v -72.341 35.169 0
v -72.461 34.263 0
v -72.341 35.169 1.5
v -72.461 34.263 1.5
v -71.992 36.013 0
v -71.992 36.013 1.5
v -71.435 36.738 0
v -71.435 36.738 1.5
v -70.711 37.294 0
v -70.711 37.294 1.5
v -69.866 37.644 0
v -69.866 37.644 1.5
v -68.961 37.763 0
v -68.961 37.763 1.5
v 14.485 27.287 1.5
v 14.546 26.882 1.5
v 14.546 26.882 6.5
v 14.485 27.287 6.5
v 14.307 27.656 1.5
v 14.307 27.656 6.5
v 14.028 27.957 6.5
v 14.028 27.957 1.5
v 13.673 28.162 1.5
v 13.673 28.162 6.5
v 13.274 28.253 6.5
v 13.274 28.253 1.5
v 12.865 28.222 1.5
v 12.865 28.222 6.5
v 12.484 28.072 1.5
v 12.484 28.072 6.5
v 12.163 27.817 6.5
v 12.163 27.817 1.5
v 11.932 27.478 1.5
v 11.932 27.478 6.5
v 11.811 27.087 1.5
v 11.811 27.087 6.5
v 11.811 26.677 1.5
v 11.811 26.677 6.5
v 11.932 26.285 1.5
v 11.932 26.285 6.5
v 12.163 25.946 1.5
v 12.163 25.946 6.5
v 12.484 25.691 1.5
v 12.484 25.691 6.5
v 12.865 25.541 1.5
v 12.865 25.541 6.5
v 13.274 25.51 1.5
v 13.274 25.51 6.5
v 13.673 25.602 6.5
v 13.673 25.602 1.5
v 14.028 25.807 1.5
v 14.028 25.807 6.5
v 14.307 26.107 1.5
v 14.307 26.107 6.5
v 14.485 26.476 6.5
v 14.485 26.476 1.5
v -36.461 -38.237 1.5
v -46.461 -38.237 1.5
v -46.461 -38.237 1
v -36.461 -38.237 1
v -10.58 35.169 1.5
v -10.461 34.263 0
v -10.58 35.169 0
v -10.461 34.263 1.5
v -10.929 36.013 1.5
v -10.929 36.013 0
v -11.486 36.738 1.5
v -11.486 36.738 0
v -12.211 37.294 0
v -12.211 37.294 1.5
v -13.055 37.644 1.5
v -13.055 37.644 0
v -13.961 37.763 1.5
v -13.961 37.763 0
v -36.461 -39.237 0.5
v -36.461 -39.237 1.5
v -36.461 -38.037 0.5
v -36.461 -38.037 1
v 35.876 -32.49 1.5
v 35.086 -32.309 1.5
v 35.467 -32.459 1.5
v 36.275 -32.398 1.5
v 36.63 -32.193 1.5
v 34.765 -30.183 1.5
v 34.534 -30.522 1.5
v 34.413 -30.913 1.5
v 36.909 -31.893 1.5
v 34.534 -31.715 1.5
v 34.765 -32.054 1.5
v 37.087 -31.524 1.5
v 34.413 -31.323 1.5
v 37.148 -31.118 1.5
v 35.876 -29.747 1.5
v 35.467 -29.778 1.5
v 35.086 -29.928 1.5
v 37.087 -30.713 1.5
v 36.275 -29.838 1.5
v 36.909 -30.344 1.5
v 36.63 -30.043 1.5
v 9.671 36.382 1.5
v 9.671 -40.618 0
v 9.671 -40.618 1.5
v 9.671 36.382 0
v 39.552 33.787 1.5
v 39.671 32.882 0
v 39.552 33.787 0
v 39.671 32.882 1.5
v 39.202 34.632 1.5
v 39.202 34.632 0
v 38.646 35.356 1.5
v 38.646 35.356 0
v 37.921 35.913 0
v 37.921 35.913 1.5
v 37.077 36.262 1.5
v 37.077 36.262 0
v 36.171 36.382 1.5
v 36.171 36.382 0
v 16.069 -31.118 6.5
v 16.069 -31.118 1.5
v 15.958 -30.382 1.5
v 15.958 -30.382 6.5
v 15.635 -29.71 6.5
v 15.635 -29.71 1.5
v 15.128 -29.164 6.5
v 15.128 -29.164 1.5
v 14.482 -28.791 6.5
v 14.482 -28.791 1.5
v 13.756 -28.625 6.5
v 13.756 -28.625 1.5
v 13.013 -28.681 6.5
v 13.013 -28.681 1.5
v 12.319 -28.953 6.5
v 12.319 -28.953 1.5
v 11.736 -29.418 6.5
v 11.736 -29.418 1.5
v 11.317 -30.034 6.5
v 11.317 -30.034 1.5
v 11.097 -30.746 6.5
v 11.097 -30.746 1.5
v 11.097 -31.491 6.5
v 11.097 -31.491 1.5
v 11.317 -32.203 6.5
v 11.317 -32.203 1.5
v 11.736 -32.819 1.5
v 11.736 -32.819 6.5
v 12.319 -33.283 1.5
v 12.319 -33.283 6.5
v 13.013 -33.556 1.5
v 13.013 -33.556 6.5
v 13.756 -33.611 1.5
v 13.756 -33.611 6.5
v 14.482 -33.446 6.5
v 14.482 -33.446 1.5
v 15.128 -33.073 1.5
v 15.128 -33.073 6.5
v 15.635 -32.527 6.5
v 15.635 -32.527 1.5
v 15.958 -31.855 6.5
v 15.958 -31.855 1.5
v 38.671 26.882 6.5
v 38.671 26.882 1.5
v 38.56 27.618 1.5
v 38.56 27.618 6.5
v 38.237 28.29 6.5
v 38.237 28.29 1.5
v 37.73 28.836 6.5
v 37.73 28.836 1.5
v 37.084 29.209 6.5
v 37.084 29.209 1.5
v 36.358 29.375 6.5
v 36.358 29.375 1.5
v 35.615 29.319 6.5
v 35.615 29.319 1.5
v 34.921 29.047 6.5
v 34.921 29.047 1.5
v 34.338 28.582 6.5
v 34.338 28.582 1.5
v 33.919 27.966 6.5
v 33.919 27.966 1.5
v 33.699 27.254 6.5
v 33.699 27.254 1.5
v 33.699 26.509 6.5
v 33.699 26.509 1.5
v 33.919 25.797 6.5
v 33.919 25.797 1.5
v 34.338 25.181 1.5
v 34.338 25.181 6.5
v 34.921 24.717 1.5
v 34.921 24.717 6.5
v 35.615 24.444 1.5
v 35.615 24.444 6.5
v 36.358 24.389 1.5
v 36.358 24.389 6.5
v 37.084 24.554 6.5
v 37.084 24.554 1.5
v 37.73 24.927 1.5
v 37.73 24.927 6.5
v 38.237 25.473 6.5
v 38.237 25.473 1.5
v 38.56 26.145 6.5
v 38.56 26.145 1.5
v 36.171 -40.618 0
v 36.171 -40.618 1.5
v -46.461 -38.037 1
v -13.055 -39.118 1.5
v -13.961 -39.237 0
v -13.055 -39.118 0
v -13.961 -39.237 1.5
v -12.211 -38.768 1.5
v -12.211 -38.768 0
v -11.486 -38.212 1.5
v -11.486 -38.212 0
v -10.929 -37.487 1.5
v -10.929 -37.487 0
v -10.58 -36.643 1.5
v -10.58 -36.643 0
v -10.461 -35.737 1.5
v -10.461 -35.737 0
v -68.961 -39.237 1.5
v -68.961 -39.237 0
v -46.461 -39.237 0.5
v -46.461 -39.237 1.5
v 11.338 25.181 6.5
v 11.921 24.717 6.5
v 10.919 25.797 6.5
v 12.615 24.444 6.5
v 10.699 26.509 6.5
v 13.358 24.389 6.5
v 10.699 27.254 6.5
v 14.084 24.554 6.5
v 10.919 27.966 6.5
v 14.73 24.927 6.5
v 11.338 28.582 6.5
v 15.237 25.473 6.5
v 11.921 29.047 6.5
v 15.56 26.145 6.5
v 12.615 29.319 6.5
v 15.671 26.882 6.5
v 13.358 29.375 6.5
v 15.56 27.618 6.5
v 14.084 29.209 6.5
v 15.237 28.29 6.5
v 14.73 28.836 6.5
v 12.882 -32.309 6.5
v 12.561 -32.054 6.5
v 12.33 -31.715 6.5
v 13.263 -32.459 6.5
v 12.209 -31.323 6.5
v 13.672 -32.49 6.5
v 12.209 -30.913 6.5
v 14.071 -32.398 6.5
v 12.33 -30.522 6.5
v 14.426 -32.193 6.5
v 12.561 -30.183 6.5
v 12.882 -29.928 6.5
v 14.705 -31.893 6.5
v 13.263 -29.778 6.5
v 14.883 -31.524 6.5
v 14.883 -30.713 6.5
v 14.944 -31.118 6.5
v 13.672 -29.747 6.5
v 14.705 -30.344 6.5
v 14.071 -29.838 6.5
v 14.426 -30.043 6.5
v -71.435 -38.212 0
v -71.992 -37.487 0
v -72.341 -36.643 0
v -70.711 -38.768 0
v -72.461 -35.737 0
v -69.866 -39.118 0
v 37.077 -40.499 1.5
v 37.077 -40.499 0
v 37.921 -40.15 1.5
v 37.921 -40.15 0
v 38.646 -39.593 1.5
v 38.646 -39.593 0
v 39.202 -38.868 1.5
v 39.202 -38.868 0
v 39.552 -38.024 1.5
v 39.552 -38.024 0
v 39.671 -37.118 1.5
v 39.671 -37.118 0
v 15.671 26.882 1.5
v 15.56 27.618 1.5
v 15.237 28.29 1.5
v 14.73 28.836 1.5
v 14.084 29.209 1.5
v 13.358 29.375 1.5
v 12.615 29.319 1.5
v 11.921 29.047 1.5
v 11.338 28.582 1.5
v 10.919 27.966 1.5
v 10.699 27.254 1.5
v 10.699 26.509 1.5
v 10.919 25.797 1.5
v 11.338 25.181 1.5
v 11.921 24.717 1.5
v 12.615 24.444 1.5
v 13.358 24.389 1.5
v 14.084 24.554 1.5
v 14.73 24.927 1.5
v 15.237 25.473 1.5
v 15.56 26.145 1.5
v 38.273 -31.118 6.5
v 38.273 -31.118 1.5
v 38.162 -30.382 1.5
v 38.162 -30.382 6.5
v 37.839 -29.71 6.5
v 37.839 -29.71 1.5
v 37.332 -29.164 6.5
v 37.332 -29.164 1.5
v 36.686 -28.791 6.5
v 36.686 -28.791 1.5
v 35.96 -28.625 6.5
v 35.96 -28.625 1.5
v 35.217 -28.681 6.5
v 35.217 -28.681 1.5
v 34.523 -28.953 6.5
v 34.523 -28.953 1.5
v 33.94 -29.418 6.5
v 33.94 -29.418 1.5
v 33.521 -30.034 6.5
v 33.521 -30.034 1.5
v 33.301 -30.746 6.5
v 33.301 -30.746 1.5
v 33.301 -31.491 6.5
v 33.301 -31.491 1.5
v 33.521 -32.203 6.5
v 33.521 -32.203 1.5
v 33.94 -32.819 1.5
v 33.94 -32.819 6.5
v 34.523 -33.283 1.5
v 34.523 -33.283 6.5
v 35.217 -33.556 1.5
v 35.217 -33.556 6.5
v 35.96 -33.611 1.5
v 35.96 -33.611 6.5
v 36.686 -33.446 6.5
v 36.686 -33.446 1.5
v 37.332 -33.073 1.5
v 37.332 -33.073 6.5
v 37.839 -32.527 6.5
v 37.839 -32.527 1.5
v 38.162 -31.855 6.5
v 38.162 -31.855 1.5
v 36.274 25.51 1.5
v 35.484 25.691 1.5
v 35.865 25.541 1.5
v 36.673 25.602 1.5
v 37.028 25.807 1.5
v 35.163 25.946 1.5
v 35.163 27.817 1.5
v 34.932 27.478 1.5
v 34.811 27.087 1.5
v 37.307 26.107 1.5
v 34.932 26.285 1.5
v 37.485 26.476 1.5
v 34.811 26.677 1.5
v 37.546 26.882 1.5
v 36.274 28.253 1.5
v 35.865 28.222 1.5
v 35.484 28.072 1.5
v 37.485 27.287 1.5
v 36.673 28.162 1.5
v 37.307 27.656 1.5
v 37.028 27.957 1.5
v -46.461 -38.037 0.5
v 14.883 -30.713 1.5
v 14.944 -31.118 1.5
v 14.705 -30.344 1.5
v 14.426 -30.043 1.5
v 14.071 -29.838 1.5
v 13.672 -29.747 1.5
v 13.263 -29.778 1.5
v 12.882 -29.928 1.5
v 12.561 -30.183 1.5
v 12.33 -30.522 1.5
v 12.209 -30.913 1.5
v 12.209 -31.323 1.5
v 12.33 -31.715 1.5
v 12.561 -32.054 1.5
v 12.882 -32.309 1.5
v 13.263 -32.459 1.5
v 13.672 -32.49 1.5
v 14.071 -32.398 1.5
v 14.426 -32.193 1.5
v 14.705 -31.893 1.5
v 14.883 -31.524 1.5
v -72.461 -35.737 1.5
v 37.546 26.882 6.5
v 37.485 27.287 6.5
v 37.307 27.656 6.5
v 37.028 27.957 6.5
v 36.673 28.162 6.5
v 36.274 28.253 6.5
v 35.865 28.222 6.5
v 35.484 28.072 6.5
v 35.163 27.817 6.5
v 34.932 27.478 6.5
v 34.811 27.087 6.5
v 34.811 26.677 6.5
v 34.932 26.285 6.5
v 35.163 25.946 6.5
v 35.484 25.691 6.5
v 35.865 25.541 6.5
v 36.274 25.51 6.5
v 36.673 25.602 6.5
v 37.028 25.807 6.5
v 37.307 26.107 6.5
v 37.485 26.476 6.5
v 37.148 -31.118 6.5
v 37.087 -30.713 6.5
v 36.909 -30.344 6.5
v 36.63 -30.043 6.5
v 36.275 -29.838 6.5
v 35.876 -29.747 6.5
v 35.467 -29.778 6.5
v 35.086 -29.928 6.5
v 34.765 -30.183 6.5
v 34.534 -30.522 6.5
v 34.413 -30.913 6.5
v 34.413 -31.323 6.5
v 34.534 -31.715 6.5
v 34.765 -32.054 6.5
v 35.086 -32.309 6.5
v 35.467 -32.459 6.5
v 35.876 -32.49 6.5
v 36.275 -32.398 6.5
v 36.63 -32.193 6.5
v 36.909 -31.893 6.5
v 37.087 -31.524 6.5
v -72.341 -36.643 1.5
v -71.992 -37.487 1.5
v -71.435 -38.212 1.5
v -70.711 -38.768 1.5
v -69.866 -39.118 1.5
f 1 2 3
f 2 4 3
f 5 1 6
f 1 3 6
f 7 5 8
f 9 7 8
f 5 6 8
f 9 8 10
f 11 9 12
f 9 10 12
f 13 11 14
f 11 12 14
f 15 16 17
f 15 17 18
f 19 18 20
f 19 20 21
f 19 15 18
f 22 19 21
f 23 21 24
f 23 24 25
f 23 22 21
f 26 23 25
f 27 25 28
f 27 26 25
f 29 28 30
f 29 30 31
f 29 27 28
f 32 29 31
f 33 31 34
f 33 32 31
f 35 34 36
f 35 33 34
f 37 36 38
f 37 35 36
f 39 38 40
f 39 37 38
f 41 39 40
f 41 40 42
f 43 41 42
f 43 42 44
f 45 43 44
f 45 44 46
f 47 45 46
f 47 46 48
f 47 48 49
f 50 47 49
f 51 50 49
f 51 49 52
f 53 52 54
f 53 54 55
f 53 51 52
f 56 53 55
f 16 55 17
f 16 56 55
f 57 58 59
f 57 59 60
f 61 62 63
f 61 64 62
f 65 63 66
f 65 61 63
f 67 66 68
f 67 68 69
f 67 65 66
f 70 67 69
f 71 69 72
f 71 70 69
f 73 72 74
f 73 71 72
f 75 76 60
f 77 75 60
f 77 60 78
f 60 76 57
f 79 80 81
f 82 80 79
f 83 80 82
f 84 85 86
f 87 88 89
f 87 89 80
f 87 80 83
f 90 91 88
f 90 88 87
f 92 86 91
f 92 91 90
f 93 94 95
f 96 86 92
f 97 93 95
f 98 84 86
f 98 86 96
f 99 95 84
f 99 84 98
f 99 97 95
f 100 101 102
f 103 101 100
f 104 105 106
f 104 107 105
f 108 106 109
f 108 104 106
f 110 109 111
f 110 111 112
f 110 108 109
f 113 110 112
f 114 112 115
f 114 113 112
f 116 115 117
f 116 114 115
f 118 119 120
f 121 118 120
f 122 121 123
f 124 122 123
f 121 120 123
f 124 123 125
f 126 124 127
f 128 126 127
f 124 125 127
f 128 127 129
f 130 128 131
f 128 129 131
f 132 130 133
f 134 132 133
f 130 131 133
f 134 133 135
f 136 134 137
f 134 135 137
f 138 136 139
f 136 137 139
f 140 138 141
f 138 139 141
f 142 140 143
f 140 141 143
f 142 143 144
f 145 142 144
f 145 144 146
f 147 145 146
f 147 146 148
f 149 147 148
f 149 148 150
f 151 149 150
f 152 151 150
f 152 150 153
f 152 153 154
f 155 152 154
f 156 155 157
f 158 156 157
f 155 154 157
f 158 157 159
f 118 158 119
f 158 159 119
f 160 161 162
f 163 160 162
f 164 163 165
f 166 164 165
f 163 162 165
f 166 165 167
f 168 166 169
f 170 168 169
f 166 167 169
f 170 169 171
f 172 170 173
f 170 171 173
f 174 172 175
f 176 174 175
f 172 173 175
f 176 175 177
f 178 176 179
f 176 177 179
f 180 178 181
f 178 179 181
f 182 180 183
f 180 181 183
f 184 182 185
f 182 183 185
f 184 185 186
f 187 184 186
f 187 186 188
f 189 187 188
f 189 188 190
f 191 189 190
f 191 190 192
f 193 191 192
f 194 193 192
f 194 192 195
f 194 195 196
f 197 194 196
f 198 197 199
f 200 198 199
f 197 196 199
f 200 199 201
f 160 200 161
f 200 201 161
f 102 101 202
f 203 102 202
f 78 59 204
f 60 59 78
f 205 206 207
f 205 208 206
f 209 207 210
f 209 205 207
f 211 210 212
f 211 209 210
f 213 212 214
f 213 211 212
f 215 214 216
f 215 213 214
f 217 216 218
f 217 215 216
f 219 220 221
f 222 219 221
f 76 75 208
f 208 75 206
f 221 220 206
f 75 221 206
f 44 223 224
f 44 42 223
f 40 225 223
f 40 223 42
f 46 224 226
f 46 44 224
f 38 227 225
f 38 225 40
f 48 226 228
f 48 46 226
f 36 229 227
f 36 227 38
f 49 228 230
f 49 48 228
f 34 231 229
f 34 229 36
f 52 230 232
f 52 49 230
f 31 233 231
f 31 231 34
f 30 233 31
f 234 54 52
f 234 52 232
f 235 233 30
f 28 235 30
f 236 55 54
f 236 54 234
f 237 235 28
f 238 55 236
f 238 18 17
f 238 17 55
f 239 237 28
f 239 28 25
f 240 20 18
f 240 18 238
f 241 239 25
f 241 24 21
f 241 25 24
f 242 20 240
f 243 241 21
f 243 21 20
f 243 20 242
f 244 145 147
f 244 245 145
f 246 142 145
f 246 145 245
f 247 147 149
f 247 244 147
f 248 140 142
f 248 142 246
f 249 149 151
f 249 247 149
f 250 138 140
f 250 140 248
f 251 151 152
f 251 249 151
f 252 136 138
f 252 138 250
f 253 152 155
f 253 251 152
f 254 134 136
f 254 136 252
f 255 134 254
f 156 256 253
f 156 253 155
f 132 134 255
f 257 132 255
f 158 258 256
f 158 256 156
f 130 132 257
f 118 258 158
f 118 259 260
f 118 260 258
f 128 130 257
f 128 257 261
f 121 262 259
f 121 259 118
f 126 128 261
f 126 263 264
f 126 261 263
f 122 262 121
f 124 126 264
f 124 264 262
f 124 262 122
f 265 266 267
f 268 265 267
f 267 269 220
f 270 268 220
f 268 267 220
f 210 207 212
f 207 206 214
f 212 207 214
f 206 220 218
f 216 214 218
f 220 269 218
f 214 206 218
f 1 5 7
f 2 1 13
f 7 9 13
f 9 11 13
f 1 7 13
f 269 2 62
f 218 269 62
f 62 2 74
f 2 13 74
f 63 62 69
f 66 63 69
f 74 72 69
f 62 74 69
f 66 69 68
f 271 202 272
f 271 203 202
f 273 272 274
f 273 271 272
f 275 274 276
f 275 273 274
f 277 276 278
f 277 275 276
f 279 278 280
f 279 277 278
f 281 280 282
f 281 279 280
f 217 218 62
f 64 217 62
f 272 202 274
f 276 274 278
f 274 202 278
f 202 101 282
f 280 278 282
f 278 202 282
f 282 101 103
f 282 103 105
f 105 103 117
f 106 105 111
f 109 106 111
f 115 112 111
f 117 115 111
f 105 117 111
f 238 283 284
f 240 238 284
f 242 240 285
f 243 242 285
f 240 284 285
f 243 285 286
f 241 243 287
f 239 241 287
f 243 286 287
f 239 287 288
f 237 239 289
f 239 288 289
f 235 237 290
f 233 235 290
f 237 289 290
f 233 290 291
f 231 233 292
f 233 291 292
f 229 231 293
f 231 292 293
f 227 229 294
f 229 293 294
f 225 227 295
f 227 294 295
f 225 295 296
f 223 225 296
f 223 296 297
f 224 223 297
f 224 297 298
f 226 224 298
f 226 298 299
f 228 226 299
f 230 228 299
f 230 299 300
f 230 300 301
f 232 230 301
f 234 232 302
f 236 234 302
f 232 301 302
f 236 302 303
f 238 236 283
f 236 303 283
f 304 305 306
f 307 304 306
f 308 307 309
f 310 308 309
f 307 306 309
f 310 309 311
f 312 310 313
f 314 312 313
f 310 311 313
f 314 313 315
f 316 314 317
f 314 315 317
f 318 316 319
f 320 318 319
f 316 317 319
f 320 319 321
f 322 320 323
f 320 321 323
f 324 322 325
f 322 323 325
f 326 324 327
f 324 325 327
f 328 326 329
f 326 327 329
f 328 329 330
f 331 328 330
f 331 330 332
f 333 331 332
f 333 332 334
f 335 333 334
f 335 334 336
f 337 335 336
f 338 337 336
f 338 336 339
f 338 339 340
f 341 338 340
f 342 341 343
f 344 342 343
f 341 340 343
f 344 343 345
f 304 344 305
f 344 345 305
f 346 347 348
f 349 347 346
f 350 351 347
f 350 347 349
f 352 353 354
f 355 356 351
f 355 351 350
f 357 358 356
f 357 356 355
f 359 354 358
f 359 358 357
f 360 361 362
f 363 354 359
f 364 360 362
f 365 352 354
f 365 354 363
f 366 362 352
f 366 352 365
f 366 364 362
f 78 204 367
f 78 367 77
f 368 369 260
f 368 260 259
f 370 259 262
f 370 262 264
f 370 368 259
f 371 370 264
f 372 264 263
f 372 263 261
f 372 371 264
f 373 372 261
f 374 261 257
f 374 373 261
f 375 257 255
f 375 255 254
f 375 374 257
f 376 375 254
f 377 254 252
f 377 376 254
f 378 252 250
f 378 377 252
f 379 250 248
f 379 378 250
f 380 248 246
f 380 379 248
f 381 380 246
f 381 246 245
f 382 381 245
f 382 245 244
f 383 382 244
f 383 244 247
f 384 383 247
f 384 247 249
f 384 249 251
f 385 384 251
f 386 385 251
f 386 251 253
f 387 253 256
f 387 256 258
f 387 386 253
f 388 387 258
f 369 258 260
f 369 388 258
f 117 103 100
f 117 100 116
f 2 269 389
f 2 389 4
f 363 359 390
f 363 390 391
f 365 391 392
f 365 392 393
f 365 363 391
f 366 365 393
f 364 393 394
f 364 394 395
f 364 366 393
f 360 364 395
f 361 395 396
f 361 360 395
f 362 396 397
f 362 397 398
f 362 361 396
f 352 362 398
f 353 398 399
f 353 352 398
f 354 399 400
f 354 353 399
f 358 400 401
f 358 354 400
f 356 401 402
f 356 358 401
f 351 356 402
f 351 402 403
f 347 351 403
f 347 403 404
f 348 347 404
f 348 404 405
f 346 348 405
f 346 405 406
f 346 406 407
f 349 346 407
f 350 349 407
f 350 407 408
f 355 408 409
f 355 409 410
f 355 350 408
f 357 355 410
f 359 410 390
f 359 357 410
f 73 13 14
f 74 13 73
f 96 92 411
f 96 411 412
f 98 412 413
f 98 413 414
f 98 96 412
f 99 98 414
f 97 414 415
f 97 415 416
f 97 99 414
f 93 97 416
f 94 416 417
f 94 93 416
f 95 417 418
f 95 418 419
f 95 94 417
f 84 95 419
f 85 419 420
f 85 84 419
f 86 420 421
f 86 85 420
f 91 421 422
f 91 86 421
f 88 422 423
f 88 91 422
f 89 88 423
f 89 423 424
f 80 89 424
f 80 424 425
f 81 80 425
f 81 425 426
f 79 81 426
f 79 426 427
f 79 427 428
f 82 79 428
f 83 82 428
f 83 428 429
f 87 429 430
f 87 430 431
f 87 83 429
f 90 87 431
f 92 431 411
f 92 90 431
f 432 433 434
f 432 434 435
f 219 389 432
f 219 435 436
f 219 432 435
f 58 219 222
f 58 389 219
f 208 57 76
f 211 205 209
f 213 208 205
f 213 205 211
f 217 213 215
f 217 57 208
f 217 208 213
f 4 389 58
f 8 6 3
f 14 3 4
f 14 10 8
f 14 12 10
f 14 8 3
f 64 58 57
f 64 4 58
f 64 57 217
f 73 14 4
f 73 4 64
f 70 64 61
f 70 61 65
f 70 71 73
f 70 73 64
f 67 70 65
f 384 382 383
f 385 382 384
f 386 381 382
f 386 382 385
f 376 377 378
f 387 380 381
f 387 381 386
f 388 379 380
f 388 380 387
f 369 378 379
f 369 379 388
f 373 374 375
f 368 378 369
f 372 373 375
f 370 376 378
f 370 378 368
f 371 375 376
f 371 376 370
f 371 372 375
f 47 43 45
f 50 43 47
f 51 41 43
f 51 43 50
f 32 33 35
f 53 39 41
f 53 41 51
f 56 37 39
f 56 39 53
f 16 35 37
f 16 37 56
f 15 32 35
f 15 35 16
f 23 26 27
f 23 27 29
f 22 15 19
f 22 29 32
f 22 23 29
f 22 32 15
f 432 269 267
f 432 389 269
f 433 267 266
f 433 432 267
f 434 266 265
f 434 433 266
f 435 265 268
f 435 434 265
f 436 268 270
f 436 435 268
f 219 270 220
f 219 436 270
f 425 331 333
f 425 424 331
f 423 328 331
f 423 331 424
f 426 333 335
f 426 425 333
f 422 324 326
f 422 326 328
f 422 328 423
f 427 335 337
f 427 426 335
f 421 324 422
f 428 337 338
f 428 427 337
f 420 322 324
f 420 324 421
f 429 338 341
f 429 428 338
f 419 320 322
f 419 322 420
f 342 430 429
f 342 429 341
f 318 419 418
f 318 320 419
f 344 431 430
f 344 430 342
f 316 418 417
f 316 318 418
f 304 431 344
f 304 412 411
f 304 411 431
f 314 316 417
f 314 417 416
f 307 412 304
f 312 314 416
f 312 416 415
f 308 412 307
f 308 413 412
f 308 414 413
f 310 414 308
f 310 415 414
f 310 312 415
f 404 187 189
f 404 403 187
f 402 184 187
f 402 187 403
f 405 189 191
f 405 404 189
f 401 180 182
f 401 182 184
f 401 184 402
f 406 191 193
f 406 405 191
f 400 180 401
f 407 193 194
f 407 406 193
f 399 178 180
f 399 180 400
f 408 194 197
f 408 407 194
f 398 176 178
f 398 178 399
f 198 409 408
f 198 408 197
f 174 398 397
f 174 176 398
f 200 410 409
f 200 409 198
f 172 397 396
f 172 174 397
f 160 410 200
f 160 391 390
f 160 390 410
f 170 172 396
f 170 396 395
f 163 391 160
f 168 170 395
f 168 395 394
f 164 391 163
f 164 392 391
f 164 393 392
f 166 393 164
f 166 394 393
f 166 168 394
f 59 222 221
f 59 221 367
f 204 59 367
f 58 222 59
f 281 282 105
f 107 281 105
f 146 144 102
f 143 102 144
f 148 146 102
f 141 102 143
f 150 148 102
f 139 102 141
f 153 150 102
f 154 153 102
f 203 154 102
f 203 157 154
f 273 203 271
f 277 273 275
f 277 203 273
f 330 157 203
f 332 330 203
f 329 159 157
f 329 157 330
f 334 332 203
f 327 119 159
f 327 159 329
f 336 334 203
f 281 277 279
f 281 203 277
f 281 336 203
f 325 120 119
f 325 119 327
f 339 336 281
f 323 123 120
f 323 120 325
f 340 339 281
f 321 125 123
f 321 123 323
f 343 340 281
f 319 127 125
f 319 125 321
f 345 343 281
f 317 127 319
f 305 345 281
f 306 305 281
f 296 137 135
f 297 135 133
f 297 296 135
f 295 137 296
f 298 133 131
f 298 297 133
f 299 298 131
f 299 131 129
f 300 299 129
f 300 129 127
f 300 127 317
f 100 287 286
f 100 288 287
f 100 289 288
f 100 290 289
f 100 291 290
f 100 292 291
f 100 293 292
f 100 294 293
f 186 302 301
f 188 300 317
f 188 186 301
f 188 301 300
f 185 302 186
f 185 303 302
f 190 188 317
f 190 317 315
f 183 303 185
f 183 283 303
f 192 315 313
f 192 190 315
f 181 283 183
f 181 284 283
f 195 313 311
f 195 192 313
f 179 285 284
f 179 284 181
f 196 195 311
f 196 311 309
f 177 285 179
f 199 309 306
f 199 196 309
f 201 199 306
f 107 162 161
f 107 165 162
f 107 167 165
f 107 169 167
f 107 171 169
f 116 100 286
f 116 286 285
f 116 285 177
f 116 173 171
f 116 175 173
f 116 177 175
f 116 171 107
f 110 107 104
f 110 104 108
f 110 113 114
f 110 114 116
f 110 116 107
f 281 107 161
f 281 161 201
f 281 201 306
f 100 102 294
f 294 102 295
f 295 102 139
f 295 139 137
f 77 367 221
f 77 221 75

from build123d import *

# Parameters (mm, degrees)
F0_W     = 62
F0_H     = 77
F0_W_2   = 30
F1_DEPTH = 1.5
F2_R     = 3.5
F3_R     = 2.5
F3_R_2   = 1.375
F4_DEPTH = 5
F5_W     = 10
F5_H     = 1
F6_DEPTH = 1
F7_W     = 10
F7_H     = 0.5
F8_DEPTH = 0.2


with BuildPart() as f1:
    # F0 (on Top) → F1 (new body)
    with BuildSketch(Plane.XY):
        with Locations((-41.460528, -0.736844)):
            Rectangle(F0_W, F0_H)
        with Locations((24.671054, -2.11842)):
            Rectangle(F0_W_2, F0_H)
    extrude(amount=F1_DEPTH)

    # F2
    f2_edges = [f1.edges().sort_by_distance(p)[0] for p in [
        (-10.460528, -39.236844, 0.75),
        (-72.460528, -39.236844, 0.75),
        (-72.460528, 37.763156, 0.75),
        (-10.460528, 37.763156, 0.75),
        (39.671054, 36.38158, 0.75),
        (39.671054, -40.61842, 0.75),
    ]]
    fillet(f2_edges, radius=F2_R)

    # F3 (on face) → F4 (join)
    with BuildSketch(Plane.XY.offset(1.5)):
        with Locations((13.569002, -31.11842)):
            Circle(F3_R)
        with Locations((13.569002, -31.11842)):
            Circle(F3_R_2, mode=Mode.SUBTRACT)
        with Locations((35.773106, -31.11842)):
            Circle(F3_R)
        with Locations((35.773106, -31.11842)):
            Circle(F3_R_2, mode=Mode.SUBTRACT)
        with Locations((36.171054, 26.88158)):
            Circle(F3_R)
        with Locations((36.171054, 26.88158)):
            Circle(F3_R_2, mode=Mode.SUBTRACT)
        with Locations((13.171054, 26.88158)):
            Circle(F3_R)
        with Locations((13.171054, 26.88158)):
            Circle(F3_R_2, mode=Mode.SUBTRACT)
    extrude(amount=F4_DEPTH)

    # F5 (on face) → F6 (cut)
    with BuildSketch(Plane.XY.offset(1.5)):
        with Locations((-41.460528, -38.736844)):
            Rectangle(F5_W, F5_H)
    extrude(amount=-F6_DEPTH, mode=Mode.SUBTRACT)

    # F7 (on face) → F8 (cut)
    with BuildSketch(Plane.XZ.offset(38.236844)):
        with Locations((-41.460528, 0.75)):
            Rectangle(F7_W, F7_H)
    extrude(amount=-F8_DEPTH, mode=Mode.SUBTRACT)


solid = f1.part
